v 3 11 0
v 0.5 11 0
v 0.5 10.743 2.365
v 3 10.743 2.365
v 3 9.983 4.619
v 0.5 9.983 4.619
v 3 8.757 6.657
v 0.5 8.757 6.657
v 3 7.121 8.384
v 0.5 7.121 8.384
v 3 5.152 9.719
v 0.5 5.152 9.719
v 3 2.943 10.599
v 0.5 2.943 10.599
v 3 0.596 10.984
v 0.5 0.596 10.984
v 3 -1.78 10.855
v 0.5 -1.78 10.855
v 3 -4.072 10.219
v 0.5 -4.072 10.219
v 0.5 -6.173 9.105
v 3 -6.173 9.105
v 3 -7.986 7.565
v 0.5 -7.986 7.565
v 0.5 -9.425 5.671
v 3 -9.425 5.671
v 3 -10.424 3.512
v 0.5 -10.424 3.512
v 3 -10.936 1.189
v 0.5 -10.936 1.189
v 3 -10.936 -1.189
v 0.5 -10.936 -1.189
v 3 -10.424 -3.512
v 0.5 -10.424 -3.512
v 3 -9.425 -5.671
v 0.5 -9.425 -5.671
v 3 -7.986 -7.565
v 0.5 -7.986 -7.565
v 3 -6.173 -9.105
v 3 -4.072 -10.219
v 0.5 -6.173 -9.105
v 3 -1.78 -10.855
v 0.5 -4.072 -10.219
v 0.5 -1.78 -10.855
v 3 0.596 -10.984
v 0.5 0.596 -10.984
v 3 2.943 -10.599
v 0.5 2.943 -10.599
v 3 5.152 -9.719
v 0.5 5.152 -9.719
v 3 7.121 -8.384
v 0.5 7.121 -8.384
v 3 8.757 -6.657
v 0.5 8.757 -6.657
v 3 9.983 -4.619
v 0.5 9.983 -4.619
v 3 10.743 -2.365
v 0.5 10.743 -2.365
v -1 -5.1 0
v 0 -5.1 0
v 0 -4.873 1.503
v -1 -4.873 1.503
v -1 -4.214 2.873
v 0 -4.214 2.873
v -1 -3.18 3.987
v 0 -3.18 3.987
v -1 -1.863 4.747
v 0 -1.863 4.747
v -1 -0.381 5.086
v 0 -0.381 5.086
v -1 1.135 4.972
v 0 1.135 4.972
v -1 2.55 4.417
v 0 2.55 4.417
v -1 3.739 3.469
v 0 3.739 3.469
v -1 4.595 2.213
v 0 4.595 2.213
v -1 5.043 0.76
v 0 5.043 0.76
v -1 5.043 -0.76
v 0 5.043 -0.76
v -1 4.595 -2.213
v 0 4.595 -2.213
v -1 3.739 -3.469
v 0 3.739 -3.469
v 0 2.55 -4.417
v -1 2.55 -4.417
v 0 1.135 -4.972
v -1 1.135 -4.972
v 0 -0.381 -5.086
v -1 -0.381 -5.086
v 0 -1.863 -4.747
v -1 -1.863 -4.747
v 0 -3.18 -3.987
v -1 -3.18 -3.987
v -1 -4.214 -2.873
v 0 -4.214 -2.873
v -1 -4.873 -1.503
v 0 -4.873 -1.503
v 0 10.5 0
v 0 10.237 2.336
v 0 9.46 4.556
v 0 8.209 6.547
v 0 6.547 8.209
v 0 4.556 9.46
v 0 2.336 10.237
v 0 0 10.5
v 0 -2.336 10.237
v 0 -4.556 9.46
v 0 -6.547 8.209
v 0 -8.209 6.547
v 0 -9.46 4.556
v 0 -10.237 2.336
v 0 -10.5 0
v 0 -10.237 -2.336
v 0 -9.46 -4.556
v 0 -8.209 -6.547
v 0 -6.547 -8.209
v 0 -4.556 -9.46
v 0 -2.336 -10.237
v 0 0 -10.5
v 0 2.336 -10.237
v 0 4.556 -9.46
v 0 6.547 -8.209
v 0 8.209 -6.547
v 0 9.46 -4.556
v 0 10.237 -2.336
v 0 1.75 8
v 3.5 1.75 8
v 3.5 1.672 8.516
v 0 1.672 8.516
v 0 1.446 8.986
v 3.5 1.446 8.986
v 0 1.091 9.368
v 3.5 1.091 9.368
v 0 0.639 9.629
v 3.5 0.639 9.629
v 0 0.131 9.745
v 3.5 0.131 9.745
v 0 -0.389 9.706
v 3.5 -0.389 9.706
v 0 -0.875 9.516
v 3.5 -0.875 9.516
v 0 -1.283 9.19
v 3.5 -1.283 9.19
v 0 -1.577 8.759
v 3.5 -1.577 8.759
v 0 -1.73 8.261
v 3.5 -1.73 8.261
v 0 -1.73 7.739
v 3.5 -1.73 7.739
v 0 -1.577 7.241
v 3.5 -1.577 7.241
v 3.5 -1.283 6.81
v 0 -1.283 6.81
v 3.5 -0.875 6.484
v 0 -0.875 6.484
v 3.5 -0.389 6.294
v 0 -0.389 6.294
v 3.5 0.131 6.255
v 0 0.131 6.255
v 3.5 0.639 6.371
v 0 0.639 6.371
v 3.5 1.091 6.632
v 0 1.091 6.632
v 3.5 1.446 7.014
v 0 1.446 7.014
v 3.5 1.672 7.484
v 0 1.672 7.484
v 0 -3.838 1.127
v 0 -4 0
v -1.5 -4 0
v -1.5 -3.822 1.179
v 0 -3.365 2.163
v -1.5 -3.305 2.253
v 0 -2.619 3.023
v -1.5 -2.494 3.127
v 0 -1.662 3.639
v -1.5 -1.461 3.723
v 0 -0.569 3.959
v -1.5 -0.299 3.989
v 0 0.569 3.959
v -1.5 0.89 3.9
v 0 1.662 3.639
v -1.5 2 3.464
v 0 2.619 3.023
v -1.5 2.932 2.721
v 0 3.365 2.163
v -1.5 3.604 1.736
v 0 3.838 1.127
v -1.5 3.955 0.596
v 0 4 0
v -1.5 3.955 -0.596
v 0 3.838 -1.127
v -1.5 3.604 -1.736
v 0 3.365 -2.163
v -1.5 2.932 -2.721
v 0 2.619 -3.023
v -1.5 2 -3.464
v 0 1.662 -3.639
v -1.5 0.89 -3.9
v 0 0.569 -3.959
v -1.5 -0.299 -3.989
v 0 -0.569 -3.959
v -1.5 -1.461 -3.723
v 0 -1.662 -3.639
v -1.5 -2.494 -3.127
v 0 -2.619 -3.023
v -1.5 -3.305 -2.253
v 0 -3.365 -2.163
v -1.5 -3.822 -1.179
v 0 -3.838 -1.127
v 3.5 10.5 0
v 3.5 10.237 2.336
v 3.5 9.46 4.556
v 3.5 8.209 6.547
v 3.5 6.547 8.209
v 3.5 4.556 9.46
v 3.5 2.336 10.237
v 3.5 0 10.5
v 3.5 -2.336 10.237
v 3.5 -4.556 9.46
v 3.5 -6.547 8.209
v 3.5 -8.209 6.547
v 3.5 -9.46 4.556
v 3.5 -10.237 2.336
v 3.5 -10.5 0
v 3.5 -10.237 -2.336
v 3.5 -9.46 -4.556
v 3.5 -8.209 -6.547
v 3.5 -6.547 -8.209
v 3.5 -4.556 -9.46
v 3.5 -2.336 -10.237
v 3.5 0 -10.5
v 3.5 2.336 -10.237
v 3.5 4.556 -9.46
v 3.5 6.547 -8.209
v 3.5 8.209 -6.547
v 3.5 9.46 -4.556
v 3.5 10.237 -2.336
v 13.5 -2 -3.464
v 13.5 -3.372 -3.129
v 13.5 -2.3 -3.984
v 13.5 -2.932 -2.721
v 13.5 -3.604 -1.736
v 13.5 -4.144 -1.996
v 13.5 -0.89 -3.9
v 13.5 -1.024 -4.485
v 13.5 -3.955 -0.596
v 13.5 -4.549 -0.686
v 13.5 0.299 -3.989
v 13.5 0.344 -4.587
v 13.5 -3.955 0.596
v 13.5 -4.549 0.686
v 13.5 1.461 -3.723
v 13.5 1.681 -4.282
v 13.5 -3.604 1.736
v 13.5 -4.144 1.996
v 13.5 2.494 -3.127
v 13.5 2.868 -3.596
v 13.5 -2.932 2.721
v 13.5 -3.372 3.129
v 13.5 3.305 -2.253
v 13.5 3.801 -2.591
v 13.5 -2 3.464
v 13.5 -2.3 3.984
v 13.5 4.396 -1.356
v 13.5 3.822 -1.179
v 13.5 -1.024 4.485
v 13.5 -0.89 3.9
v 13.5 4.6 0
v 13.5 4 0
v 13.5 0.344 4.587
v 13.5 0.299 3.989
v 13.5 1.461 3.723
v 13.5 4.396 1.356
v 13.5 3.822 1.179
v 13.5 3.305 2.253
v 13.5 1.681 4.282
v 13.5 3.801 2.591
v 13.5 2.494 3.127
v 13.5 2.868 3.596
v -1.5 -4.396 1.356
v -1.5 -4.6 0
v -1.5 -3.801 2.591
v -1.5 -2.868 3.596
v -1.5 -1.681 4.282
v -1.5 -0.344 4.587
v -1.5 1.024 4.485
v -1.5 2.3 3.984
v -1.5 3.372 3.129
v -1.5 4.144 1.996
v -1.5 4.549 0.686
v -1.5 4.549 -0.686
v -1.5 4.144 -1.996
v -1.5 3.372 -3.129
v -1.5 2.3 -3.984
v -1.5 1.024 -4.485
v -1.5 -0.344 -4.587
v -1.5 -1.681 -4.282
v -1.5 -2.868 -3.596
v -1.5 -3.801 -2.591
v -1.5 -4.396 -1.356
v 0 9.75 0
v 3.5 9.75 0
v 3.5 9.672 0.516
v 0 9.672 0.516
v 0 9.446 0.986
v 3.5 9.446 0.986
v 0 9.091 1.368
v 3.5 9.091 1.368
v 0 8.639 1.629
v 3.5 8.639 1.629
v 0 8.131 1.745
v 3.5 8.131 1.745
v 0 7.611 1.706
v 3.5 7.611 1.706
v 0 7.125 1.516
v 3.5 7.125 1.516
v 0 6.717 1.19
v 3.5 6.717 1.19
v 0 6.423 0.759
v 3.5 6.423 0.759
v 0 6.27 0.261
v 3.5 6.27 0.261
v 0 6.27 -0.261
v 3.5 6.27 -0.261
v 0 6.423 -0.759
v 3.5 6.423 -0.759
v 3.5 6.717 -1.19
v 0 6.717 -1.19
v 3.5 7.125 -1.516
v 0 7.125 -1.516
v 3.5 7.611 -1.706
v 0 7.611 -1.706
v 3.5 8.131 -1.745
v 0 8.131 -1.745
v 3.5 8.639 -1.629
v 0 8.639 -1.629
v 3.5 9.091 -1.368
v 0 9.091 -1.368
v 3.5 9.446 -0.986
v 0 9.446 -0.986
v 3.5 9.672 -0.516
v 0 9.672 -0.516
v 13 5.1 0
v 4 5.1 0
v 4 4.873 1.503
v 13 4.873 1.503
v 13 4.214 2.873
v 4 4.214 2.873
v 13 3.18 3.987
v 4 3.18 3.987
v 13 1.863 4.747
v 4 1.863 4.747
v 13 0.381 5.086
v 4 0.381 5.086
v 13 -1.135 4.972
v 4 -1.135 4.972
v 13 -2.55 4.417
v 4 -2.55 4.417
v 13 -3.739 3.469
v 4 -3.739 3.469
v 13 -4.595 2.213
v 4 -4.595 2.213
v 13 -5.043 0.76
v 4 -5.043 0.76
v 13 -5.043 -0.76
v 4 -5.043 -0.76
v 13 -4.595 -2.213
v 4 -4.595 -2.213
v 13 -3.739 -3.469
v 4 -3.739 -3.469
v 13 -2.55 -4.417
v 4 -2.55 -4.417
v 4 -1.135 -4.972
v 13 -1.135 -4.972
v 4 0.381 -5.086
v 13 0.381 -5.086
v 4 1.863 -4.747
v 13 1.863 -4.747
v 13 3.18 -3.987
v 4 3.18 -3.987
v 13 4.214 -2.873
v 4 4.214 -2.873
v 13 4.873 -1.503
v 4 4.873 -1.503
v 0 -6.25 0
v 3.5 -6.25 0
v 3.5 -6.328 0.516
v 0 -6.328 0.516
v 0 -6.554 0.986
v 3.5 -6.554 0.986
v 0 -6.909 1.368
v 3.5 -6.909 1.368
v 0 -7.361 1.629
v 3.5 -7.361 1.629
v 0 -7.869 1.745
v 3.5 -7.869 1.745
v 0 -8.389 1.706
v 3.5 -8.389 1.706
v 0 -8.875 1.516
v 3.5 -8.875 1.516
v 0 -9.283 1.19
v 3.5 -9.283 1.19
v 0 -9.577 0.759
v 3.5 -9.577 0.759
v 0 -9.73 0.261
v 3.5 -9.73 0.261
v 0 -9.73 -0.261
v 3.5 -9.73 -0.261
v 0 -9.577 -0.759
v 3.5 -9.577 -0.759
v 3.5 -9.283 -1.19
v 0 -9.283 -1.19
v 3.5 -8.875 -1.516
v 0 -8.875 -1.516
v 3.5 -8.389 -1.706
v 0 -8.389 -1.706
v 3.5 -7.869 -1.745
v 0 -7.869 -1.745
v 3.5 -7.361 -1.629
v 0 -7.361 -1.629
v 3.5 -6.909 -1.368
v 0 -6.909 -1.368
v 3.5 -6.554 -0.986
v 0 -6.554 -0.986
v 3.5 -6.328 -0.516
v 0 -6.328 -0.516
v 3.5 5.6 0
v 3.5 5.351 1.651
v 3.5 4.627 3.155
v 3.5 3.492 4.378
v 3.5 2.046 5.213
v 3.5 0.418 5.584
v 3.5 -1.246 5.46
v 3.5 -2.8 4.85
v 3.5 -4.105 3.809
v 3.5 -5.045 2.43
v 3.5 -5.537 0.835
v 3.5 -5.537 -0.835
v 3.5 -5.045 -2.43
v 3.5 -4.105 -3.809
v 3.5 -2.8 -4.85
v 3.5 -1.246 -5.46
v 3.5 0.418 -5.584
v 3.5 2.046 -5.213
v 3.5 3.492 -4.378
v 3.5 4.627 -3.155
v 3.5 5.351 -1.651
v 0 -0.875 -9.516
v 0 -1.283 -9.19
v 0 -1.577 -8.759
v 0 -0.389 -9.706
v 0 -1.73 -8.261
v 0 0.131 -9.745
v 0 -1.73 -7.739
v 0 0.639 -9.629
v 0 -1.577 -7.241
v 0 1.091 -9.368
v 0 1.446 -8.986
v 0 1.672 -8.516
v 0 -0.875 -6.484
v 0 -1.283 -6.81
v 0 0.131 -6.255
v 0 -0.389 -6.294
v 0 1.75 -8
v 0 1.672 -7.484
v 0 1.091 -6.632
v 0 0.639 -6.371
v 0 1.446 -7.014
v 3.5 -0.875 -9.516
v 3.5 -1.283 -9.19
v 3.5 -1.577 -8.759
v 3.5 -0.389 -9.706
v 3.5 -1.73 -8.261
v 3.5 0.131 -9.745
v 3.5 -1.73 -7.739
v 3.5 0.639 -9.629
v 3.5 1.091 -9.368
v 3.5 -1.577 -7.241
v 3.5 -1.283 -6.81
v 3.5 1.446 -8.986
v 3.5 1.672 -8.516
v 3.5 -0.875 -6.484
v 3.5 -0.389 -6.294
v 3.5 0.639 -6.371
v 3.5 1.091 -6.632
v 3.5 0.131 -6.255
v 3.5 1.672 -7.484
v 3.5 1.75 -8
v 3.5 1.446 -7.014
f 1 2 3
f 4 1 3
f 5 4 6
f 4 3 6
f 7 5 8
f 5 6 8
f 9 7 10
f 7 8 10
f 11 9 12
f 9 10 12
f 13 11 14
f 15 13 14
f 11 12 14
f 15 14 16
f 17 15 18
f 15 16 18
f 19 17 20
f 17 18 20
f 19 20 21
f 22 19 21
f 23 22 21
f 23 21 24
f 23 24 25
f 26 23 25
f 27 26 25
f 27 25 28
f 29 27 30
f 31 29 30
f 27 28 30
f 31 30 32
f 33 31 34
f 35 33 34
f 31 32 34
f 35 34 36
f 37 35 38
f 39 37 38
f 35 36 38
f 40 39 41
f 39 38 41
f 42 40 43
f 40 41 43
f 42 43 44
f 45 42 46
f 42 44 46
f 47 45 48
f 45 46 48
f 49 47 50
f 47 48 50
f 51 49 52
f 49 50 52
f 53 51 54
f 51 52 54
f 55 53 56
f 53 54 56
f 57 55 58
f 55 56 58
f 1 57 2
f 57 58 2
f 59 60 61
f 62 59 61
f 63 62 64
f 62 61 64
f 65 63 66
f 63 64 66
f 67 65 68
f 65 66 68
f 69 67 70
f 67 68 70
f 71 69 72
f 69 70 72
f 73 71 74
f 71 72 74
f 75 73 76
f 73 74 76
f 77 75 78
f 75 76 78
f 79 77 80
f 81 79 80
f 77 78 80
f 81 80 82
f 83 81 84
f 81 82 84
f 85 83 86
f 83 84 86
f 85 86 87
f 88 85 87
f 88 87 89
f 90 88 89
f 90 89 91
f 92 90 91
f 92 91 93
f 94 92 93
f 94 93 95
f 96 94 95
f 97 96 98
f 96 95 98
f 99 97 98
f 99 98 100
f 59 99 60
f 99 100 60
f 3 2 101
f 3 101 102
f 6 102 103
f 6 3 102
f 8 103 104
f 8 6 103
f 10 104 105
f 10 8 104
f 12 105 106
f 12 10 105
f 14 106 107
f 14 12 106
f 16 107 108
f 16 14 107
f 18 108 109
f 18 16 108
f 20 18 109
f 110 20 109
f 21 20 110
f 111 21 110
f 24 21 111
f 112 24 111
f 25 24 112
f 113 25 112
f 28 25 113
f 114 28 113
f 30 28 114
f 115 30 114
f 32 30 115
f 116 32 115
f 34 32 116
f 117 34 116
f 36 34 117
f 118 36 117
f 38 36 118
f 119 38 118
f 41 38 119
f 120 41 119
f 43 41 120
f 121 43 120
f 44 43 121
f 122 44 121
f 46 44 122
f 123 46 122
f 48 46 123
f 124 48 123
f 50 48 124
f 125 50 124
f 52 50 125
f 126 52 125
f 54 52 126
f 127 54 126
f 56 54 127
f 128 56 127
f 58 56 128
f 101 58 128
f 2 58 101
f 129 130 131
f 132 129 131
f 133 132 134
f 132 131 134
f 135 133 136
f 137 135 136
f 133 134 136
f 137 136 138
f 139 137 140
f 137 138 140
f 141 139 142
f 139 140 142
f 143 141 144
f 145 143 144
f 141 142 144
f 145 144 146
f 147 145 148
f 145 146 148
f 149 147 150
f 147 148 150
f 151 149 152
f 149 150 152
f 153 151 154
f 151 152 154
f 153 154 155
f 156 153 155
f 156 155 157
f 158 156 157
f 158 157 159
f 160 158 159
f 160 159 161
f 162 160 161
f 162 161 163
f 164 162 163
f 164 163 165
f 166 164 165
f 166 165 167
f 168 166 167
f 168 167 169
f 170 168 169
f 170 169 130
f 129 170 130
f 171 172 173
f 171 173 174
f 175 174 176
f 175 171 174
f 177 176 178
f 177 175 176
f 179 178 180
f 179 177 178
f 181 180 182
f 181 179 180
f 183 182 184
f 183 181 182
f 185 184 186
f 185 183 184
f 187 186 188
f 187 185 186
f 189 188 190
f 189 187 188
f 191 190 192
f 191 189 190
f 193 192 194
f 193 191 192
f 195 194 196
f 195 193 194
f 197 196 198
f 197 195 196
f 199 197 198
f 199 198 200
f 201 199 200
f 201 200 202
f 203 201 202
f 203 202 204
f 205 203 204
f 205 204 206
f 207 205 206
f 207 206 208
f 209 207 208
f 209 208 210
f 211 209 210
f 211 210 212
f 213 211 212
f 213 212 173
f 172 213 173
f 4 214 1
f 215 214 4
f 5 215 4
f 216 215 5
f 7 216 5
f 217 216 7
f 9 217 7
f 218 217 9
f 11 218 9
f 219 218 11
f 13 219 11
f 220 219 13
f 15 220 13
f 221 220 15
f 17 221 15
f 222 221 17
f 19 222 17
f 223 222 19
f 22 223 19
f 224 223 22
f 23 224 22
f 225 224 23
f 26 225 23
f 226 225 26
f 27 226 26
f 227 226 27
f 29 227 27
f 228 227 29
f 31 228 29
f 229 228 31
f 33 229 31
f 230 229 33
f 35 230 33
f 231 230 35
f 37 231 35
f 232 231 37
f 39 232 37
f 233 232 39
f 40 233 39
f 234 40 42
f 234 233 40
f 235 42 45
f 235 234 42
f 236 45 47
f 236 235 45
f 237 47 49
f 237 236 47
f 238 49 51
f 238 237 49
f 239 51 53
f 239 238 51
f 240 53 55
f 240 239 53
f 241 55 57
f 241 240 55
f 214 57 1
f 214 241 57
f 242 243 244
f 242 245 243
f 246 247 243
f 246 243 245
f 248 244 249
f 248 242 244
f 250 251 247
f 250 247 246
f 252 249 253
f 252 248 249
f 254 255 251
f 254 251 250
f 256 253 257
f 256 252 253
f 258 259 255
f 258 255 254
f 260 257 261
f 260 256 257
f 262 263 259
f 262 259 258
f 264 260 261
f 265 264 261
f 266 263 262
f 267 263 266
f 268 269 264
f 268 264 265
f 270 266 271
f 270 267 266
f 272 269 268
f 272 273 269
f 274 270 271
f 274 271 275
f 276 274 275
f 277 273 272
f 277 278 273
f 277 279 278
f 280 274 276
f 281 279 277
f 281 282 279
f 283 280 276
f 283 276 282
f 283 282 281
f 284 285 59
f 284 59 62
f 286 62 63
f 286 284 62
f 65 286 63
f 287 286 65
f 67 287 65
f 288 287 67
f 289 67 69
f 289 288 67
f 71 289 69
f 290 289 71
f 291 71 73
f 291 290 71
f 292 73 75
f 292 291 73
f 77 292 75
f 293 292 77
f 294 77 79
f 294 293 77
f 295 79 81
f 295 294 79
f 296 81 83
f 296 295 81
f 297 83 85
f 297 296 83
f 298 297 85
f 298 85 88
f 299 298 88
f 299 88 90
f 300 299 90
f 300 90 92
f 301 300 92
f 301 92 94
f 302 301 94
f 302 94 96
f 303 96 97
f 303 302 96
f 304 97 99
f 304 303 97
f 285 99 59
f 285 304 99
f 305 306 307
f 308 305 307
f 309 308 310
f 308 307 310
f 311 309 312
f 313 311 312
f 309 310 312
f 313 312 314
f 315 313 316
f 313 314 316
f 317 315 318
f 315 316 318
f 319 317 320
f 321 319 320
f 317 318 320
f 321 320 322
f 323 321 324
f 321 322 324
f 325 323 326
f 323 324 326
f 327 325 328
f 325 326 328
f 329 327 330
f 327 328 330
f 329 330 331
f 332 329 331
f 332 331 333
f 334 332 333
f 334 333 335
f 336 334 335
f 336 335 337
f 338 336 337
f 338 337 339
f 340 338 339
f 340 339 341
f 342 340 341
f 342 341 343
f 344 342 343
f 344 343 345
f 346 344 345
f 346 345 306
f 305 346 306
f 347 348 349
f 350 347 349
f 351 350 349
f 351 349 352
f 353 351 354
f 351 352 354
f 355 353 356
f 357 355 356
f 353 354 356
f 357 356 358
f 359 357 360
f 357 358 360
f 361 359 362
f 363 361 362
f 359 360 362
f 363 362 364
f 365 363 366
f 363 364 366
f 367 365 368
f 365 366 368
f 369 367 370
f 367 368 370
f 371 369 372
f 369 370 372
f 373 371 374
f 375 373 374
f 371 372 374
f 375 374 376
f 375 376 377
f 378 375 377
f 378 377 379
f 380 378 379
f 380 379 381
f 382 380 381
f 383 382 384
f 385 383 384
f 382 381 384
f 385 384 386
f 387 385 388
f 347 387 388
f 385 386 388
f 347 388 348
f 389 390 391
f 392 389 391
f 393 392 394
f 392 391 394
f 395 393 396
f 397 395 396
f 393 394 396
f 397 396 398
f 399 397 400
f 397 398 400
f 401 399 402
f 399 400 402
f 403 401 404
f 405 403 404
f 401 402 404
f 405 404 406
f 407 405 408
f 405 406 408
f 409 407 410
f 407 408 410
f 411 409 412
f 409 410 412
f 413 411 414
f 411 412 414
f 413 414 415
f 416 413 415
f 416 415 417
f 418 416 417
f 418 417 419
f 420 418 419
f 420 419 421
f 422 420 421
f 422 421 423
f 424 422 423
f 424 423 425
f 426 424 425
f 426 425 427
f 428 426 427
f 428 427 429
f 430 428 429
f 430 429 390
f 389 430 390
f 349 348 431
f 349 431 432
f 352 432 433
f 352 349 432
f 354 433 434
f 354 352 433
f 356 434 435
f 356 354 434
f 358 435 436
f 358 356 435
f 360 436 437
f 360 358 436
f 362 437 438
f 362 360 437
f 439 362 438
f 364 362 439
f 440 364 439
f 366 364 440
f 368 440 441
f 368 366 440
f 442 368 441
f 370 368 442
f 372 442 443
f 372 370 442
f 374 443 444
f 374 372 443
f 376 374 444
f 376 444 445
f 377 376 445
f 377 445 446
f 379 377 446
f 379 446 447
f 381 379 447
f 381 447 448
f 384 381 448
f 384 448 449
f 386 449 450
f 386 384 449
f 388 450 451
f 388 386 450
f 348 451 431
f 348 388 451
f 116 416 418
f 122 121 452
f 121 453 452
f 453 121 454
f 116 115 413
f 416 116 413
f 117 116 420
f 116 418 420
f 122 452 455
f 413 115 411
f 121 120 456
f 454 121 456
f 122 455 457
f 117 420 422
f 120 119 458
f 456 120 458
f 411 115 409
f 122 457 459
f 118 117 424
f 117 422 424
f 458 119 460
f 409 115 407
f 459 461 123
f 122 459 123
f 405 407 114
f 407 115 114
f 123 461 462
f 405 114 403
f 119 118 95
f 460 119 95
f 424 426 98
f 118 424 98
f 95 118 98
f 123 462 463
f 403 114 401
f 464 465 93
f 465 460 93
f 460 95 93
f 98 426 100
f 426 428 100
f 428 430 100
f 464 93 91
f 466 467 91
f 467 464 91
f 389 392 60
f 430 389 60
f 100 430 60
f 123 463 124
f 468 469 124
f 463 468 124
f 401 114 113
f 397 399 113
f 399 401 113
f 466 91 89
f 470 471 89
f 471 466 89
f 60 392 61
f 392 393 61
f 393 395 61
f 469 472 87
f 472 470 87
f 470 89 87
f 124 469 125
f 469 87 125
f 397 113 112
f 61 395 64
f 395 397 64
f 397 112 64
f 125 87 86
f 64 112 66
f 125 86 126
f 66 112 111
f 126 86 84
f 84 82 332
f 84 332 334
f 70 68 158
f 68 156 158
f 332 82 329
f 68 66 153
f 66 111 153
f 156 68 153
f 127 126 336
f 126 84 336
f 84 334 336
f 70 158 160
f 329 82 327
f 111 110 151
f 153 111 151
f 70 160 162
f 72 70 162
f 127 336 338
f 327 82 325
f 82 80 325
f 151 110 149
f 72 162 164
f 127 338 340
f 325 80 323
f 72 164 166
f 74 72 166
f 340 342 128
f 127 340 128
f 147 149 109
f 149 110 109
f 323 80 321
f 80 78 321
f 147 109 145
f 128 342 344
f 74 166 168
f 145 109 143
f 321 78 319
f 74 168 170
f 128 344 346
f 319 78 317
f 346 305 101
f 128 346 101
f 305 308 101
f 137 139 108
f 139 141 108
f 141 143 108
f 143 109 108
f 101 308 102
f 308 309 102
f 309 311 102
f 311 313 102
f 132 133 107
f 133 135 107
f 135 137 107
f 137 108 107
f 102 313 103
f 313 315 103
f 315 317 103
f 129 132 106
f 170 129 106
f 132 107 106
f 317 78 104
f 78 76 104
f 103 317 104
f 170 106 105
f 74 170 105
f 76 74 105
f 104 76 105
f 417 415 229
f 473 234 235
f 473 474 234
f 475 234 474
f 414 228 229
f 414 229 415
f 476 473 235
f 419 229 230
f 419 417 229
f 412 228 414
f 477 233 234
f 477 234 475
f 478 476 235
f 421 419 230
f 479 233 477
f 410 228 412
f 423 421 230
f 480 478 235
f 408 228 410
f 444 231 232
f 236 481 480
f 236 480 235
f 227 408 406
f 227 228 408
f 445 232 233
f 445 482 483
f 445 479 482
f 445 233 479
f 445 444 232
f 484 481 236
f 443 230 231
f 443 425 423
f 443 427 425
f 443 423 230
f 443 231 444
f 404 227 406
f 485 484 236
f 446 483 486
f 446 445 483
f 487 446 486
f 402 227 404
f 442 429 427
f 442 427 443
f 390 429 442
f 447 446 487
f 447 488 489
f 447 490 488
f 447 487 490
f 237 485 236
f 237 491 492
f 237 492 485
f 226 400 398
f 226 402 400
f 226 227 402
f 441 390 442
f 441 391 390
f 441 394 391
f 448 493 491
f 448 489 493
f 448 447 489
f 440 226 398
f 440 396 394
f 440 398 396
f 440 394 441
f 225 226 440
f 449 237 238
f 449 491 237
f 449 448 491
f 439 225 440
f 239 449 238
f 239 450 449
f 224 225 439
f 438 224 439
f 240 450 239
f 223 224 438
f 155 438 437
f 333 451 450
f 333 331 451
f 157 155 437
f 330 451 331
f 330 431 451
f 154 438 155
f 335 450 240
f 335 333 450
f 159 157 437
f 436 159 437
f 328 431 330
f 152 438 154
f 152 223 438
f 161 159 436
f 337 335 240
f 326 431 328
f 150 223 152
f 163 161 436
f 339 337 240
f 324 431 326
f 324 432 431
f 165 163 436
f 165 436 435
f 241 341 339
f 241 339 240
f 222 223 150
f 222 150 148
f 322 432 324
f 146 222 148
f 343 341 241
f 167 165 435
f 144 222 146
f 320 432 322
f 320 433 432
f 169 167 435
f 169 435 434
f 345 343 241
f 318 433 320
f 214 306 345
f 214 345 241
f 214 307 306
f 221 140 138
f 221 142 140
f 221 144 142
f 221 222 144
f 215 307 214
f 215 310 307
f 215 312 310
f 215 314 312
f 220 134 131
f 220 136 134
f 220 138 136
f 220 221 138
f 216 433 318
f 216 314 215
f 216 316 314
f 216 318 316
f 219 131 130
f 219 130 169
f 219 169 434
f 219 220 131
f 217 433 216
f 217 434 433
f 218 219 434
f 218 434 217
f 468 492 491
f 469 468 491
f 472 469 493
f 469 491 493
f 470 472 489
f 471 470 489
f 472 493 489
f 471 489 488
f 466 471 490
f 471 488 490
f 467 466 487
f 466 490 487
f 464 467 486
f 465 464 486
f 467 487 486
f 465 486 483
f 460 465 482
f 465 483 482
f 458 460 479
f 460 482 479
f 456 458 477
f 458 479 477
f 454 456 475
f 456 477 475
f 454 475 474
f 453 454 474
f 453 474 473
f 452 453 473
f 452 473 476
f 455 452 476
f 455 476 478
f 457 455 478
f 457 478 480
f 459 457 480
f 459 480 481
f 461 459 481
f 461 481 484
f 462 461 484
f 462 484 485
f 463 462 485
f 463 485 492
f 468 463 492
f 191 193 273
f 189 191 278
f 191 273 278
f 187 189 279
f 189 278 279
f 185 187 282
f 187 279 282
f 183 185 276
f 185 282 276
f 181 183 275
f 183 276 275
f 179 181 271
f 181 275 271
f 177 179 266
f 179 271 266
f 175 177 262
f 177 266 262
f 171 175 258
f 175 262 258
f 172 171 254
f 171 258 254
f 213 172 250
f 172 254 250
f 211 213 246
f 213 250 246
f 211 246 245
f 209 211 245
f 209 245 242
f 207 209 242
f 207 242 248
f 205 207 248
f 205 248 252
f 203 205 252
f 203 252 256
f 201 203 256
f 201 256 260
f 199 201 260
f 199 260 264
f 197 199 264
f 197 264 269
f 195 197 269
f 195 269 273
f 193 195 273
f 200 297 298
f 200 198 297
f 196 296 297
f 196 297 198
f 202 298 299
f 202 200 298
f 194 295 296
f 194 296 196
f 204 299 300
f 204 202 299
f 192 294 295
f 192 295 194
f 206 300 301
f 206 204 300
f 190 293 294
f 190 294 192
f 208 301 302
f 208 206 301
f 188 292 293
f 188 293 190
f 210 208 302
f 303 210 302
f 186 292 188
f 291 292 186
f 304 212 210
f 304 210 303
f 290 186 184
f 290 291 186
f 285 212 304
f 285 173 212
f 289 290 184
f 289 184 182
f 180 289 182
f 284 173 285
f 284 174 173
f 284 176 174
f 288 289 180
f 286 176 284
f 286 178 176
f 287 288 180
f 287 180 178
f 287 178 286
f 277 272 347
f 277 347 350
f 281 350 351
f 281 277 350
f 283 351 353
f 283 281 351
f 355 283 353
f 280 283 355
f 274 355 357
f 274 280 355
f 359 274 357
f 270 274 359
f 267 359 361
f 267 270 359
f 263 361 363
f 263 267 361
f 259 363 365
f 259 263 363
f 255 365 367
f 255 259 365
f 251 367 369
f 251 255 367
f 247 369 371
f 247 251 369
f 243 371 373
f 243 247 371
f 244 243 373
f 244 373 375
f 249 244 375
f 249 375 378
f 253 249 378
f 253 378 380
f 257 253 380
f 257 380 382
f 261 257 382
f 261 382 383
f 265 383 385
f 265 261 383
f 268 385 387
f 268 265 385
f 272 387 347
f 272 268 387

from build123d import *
from build123d import SkipClean  # not in build123d's __all__

# Parameters (mm, degrees)
F0_R      = 11
F1_DEPTH  = 3.5
F2_R      = 5.1
F3_DEPTH  = 10
F4_R      = 4
F5_DEPTH  = 25
F6_R      = 5.1
F6_R_2    = 4
F7_DEPTH  = 1.5
F8_SIZE   = 0.5
F9_R      = 1.75
F10_DEPTH = 5.001


# Not quite as in the source:
# - after a boolean that leaves OpenCascade's solid faulty, fix() repairs it


with BuildPart() as f1:
    # F0 (on Right) → F1 (new body)
    with BuildSketch(Plane.YZ):
        Circle(F0_R)
    extrude(amount=F1_DEPTH)

    # F2 (on face) → F3 (join)
    with BuildSketch(Plane.YZ.offset(3.5)):
        Circle(F2_R)
    extrude(amount=F3_DEPTH)

    # F4 (on face) → F5 (cut)
    with BuildSketch(Plane.YZ.offset(13.5)):
        Circle(F4_R)
    extrude(amount=-F5_DEPTH, mode=Mode.SUBTRACT)

    # F6 (on face) → F7 (join)
    with BuildSketch(Plane(origin=(0, 0, 0), x_dir=(0, -1, 0), z_dir=(-1, 0, 0))):
        Circle(F6_R)
        Circle(F6_R_2, mode=Mode.SUBTRACT)
    with SkipClean():  # cleaning this boolean's faces spoils the solid; the shape is the same uncleaned
        extrude(amount=F7_DEPTH)

    # F8
    f8_edges = [f1.edges().sort_by_distance(p)[0] for p in [
        (13.5, -5.1, 0),
        (3.5, -11, 0),
        (0, -11, 0),
        (-1.5, 5.1, 0),
        (3.5, -5.1, 0),
    ]]
    chamfer(f8_edges, length=F8_SIZE)

    # F9 (on face) → F10 (cut, through all)
    with BuildSketch(Plane.YZ.offset(3.5)):
        with Locations((0, 8)):
            Circle(F9_R)
        with Locations((-8, 0)):
            Circle(F9_R)
        with Locations((0, -8)):
            Circle(F9_R)
        with Locations((8, 0)):
            Circle(F9_R)
    extrude(amount=-F10_DEPTH, mode=Mode.SUBTRACT)

    add(f1.part.fix(), mode=Mode.REPLACE)


solid = f1.part
